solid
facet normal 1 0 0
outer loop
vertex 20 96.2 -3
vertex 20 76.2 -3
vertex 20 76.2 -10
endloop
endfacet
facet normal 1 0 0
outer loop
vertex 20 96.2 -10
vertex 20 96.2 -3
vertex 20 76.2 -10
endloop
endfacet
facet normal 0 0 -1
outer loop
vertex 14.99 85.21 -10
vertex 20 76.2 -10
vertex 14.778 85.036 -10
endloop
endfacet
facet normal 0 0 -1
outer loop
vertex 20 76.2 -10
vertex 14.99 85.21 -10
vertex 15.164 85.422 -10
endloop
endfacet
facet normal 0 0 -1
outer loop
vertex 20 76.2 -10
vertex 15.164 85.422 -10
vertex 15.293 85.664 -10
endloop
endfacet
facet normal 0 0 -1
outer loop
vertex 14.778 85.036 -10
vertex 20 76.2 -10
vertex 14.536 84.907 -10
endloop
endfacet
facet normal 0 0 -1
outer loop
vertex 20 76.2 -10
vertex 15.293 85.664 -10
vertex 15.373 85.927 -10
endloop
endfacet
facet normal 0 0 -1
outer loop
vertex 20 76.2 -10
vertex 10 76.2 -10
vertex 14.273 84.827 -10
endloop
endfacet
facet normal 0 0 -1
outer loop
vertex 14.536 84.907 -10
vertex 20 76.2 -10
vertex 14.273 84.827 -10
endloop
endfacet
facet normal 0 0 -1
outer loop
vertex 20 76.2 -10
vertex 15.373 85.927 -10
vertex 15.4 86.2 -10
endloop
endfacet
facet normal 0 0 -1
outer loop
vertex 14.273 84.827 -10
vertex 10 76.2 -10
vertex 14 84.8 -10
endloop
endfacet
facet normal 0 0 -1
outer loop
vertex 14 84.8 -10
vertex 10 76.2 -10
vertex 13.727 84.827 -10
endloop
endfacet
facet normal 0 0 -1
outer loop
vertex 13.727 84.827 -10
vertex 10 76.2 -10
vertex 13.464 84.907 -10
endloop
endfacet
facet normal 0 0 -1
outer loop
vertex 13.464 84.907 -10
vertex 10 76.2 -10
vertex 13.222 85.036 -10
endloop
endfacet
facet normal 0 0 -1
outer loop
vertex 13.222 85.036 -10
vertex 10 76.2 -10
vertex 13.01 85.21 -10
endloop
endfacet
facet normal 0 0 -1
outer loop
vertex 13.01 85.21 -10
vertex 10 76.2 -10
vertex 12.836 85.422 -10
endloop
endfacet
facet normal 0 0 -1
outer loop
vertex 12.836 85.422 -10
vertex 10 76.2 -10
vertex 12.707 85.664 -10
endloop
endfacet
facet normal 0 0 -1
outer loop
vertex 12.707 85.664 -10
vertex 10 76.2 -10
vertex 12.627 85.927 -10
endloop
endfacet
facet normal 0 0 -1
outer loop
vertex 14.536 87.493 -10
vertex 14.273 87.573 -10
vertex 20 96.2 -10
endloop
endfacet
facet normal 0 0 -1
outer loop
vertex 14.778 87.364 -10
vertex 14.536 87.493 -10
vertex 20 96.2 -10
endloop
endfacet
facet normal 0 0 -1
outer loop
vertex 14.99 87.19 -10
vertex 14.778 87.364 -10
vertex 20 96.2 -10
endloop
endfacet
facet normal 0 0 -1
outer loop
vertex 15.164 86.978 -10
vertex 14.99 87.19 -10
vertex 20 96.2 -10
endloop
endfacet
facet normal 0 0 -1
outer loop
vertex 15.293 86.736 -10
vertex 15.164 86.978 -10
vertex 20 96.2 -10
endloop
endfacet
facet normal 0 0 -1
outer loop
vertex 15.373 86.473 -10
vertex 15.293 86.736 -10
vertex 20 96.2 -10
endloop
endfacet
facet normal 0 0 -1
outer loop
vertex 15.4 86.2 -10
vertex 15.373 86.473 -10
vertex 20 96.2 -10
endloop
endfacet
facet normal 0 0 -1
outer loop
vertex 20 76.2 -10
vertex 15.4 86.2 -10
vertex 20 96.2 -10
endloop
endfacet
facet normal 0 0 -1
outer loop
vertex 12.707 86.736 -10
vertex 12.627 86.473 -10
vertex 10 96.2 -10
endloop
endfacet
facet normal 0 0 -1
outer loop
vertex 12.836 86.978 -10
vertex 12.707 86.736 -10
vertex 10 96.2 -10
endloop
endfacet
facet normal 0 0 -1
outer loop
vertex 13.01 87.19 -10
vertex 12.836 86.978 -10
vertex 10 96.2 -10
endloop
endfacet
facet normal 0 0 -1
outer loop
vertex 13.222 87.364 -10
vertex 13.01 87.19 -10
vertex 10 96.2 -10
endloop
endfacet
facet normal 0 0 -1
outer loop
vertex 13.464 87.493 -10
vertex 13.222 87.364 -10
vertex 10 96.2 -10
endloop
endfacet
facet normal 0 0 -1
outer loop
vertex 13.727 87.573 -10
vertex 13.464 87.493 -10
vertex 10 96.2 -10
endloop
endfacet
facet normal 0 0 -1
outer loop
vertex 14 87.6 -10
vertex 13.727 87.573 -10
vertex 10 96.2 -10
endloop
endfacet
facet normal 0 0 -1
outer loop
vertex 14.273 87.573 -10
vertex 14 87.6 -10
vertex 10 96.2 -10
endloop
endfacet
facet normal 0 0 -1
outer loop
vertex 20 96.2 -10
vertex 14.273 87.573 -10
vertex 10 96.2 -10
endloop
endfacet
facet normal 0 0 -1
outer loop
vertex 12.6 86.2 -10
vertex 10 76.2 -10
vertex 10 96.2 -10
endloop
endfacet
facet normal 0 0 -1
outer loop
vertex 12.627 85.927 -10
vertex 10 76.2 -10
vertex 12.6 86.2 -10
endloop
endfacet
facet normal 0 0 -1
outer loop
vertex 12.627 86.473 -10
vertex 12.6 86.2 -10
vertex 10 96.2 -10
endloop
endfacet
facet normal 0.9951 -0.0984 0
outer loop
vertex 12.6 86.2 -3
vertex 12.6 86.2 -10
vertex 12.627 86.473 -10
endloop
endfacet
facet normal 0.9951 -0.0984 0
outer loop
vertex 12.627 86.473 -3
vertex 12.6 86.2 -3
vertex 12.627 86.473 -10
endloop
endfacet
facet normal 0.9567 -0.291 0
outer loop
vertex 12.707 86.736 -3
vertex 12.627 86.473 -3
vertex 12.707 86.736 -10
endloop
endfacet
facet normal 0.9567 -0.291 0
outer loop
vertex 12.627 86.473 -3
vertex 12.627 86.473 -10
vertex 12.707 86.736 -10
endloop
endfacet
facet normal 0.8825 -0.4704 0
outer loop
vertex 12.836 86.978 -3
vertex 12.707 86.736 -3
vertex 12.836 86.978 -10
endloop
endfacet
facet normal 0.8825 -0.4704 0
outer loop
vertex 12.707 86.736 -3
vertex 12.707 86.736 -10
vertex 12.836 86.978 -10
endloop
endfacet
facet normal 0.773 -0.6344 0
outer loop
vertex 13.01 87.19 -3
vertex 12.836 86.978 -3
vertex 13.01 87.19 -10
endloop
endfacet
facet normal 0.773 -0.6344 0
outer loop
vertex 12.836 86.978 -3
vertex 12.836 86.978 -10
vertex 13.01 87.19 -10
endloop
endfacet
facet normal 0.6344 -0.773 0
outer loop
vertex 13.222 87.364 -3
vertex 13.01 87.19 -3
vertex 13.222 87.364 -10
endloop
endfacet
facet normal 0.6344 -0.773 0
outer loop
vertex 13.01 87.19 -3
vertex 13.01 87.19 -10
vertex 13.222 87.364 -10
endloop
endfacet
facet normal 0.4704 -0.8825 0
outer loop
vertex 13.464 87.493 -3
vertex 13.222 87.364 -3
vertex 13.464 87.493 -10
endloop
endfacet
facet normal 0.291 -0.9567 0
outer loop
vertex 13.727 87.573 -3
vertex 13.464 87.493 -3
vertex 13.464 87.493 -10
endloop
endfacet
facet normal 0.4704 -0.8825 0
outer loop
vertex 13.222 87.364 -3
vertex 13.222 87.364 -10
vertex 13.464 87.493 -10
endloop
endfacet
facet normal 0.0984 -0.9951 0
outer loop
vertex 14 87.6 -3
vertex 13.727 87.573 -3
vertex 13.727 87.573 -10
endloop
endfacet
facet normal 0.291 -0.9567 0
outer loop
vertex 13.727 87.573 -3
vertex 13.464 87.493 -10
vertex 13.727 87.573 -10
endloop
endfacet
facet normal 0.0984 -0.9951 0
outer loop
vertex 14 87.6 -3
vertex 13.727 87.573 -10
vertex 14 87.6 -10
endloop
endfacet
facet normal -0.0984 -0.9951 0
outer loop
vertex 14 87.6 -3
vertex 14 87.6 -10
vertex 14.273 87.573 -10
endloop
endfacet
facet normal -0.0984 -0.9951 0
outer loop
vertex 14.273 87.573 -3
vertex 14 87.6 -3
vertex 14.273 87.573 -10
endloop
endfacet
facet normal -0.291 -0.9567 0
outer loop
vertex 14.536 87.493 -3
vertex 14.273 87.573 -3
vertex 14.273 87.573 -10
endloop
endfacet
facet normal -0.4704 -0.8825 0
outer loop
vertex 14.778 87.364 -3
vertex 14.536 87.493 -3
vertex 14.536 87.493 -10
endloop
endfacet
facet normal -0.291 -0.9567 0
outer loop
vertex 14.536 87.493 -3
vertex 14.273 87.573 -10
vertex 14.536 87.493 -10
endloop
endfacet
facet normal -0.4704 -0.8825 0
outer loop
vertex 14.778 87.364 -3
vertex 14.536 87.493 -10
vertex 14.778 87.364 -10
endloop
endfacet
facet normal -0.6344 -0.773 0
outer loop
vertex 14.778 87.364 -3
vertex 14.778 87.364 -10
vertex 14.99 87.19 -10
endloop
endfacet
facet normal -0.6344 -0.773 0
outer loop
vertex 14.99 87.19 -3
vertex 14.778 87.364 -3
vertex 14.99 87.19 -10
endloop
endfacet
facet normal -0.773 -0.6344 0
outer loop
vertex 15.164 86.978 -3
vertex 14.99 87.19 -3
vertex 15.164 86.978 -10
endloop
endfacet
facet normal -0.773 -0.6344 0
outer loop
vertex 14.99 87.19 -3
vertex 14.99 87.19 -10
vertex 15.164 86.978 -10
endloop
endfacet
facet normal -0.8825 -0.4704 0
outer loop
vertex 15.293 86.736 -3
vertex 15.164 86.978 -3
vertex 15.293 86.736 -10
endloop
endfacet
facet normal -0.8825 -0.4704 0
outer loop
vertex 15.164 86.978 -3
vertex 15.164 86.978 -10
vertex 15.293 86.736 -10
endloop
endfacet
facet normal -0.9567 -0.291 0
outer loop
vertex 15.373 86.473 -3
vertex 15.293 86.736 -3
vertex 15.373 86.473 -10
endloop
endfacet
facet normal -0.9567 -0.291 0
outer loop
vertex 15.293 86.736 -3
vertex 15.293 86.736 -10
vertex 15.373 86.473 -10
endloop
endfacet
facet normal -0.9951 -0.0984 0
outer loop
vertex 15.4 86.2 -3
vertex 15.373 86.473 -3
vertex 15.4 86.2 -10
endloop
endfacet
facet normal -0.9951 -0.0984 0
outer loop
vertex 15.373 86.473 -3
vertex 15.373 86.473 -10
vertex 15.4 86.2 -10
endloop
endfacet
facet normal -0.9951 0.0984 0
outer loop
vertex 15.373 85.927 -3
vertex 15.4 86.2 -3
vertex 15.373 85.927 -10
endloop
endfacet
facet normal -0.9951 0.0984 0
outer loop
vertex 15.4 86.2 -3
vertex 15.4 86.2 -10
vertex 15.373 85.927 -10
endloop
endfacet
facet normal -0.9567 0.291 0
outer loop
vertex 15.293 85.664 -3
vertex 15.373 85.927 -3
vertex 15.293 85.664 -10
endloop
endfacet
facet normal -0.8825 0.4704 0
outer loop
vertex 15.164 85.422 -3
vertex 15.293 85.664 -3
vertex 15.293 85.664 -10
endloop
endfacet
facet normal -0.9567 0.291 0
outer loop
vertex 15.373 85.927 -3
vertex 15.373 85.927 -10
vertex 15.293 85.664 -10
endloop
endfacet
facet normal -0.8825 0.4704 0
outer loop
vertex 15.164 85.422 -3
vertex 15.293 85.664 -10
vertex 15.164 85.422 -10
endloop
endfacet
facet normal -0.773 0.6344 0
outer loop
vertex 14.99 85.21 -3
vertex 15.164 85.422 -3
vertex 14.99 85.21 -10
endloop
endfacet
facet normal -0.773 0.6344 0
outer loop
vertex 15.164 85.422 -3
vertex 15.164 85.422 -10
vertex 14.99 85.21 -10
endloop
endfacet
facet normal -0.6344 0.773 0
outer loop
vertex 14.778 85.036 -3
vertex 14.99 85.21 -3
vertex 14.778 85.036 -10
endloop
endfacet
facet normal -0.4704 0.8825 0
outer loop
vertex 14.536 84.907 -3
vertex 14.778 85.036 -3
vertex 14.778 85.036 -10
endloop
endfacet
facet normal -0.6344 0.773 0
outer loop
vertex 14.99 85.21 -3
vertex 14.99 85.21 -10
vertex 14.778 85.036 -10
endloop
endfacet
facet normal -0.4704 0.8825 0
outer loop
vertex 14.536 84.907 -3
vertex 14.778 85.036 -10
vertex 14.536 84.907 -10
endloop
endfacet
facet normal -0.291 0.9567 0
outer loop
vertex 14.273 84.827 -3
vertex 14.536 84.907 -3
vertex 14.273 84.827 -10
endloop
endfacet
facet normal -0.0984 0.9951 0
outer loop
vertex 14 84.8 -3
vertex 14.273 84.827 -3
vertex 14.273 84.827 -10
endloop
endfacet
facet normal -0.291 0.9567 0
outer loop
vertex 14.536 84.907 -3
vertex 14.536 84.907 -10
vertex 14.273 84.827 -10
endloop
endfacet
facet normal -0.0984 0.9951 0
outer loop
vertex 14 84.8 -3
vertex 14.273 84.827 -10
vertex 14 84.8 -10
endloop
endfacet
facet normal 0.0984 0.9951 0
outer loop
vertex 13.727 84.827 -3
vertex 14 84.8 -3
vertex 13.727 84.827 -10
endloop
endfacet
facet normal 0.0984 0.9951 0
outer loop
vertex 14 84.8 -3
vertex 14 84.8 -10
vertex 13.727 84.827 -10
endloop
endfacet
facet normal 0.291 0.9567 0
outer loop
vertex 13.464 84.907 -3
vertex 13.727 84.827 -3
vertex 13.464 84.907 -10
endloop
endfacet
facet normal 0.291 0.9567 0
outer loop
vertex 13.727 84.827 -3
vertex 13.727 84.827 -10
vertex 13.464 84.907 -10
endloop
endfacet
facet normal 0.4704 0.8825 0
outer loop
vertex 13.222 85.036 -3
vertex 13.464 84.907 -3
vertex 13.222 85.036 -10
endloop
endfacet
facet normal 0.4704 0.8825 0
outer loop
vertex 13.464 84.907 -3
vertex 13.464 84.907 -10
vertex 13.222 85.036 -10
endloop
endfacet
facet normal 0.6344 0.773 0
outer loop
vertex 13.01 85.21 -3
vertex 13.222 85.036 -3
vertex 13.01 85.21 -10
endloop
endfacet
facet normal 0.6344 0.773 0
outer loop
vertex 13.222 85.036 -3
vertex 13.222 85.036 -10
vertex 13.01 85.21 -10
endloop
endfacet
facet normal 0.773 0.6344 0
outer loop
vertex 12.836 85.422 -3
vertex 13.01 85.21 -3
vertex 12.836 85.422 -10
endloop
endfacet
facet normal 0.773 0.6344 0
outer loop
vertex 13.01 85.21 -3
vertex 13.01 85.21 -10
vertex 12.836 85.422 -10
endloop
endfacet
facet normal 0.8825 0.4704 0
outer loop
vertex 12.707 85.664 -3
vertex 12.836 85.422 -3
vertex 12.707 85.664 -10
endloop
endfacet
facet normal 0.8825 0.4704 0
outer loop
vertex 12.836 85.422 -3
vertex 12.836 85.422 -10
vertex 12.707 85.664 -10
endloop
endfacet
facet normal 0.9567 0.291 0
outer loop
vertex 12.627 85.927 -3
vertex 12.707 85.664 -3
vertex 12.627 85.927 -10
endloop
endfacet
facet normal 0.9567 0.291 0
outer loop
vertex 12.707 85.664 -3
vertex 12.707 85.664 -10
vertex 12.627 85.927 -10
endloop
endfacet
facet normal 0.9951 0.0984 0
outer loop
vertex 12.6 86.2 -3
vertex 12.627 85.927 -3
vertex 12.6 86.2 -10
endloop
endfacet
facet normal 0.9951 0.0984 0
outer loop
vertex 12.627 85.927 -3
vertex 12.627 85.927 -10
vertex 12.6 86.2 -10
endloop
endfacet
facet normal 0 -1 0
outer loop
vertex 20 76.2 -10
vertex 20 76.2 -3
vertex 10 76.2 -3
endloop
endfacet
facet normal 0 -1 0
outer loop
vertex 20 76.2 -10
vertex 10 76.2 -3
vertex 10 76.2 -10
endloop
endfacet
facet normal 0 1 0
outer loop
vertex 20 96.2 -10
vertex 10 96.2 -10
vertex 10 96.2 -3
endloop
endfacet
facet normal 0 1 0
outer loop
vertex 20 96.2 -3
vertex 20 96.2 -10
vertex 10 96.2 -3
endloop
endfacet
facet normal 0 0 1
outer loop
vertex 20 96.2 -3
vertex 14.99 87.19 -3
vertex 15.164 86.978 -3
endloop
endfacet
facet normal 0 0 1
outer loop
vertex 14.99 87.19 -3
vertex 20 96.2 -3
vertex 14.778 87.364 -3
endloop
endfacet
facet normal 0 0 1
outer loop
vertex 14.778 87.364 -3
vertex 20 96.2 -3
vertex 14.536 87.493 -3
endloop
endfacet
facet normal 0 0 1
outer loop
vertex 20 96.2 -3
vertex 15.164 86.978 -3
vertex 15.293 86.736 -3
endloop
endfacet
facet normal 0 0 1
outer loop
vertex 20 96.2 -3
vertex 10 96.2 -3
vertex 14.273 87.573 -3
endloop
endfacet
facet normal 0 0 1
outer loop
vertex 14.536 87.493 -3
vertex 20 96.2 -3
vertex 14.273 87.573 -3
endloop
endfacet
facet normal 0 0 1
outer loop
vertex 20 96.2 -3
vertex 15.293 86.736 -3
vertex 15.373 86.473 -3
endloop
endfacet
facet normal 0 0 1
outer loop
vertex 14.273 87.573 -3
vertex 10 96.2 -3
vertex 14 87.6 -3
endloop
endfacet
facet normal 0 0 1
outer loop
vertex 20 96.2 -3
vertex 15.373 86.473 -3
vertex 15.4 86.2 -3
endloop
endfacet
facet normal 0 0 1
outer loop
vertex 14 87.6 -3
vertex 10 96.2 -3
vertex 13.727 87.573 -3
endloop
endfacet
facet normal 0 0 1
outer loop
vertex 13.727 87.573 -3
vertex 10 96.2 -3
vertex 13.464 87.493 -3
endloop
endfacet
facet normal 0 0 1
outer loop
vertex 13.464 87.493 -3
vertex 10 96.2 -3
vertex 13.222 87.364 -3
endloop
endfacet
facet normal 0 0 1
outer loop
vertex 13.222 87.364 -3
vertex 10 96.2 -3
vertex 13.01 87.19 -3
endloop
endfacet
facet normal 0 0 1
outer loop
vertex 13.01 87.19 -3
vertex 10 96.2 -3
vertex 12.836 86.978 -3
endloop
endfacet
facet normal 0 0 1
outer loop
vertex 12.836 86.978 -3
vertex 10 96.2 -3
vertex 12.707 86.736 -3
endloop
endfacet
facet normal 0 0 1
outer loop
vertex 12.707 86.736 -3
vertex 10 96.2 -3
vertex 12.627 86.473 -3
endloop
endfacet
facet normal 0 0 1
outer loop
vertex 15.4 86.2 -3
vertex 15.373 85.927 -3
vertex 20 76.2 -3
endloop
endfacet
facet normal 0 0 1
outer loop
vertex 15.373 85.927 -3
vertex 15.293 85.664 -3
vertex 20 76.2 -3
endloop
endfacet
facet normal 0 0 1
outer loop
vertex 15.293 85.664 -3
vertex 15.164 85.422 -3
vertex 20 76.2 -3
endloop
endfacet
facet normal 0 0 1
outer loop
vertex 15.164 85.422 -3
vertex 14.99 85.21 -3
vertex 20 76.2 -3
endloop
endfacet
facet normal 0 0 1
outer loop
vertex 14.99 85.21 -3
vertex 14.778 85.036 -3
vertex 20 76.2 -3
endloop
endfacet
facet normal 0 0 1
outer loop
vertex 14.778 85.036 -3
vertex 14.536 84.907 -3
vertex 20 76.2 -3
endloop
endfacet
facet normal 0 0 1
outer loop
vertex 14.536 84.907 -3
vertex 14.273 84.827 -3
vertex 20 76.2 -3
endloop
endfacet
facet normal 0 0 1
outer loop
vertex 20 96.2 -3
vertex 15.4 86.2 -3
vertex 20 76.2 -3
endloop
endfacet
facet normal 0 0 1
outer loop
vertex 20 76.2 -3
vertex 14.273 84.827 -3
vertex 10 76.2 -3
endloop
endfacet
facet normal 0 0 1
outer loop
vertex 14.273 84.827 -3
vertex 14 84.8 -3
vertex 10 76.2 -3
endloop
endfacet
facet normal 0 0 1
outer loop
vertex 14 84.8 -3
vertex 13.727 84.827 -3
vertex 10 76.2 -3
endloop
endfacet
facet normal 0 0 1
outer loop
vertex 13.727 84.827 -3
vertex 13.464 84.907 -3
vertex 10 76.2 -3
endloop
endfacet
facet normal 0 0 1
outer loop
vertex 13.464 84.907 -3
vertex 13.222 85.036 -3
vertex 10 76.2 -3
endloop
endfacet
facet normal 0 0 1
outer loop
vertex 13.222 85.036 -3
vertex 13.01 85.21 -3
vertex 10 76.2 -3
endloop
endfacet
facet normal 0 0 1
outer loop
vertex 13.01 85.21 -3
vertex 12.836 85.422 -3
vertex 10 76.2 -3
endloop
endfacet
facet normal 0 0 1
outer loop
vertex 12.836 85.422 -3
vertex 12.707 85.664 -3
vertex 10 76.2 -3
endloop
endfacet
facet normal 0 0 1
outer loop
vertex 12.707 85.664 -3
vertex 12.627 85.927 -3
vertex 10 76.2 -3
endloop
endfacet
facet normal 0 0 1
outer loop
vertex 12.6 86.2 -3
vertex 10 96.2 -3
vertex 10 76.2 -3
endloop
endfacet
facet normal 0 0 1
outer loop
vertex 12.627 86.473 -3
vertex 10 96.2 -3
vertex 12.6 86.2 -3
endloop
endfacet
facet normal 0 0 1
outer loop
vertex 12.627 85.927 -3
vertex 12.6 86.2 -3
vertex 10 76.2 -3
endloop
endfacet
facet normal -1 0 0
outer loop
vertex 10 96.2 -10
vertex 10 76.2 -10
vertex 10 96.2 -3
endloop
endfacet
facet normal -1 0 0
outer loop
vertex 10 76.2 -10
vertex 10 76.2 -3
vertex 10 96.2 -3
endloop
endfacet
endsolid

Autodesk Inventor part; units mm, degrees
ref_plane "YZ Plane" through (0, 0, 0) normal (1, 0, 0) x (0, 1, 0)
ref_plane "XZ Plane" through (0, 0, 0) normal (0, 1, 0) x (-1, 0, 0)
ref_plane "XY Plane" through (0, 0, 0) normal (0, 0, 1) x (1, 0, 0)
sketch "Sketch1" plane through (0, 0, 0) normal (0, 1, 0) x (-1, 0, 0)
  line L0 (-7.25, 7.25) -> (7.25, 7.25)
  line L1 (7.25, 7.25) -> (7.25, -7.25)
  line L2 (7.25, -7.25) -> (-7.25, -7.25)
  line L3 (-7.25, -7.25) -> (-7.25, 7.25)
  line L4 (-7.25, 7.25) -> (7.25, -7.25) construction
  line L5 (7.25, 7.25) -> (-7.25, -7.25) construction
  point P0 (0, 0)
  dimension "d0" = 14.5
  dimension "d1" = 14.5
extrude "Extrusion1" add sketch "Sketch1" along normal blind 76.2
sketch "Sketch2" plane through (0, 76.2, 0) normal (0, 1, 0) x (1, 0, 0)
  line L0 (10, -10) -> (-10, -10)
  line L1 (-10, -10) -> (-10, 10)
  line L2 (-10, 10) -> (10, 10)
  line L3 (10, 10) -> (10, -10)
  line L4 (10, -10) -> (-10, 10) construction
  line L5 (-10, -10) -> (10, 10) construction
  point P0 (0, 0)
  dimension "d4" = 20
  dimension "d5" = 20
extrude "Extrusion2" add sketch "Sketch2" along normal blind 5
sketch "Sketch3" plane through (0, 81.2, 0) normal (0, 1, 0) x (1, 0, 0)
  line L0 (7.5, -7.5) -> (-7.5, -7.5)
  line L1 (-7.5, -7.5) -> (-7.5, 7.5)
  line L2 (-7.5, 7.5) -> (7.5, 7.5)
  line L3 (7.5, 7.5) -> (7.5, -7.5)
  line L4 (7.5, -7.5) -> (-7.5, 7.5) construction
  line L5 (-7.5, -7.5) -> (7.5, 7.5) construction
  line L6 (10, -10) -> (-10, -10)
  line L7 (-10, -10) -> (-10, 10)
  line L8 (-10, 10) -> (10, 10)
  line L9 (10, 10) -> (10, -10)
  line L10 (10, -10) -> (-10, 10) construction
  line L11 (-10, -10) -> (10, 10) construction
  point P0 (0, 0)
  dimension "d8" = 15
  dimension "d9" = 15
extrude "Extrusion3" add sketch "Sketch3" along normal blind 76.2
sketch "Sketch4" plane through (10, 76.2, 10) normal (1, 0, 0) x (0, 0, -1)
  line L0 (20, 0) -> (20, 81.2) projected
  line L1 (15, 81.2) -> (15, 0)
  line L2 (0, 0) -> (20, 0) projected
  line L3 (15, 81.2) -> (13, 81.2)
  line L4 (17.5, 81.2) -> (2.5, 81.2) projected
  line L5 (13, 81.2) -> (13, 0)
  line L6 (13, 0) -> (15, 0)
  line L7 (20, 81.2) -> (0, 81.2) projected
  point P0 (10, -76.2)
  dimension "d12" = 2
extrude "Extrusion4" add sketch "Sketch4" along normal blind 10 contours L2 L5 L3 L1
sketch "Sketch5" plane through (10, 76.2, -3) normal (0, 0, 1) x (1, 0, 0)
  line L0 (0, 81.2) -> (10, 81.2) projected
  line L1 (10, 81.2) -> (8, 81.2)
  line L2 (8, 81.2) -> (8, 0)
  line L3 (8, 0) -> (10, 0)
  line L4 (10, 0) -> (10, 81.2)
  point P0 (-10, -76.2)
  dimension "d15" = 2
extrude "Extrusion5" add sketch "Sketch5" along normal blind 8
sketch "Sketch6" plane through (20, 76.2, 10) normal (1, 0, 0) x (0, 0, -1)
  line L0 (5, 81.2) -> (3, 81.2)
  line L1 (3, 81.2) -> (3, 0)
  line L2 (3, 0) -> (5, 0)
  line L3 (5, 0) -> (5, 81.2)
  point P0 (10, -76.2)
  dimension "d18" = 2
extrude "Extrusion6" add sketch "Sketch6" against normal blind 4
sketch "Sketch7" plane through (0, 76.2, 0) normal (0, -1, 0) x (1, 0, 0)
  line L0 (10, -5) -> (20, -5)
  line L1 (20, -5) -> (20, 7)
  line L2 (20, 7) -> (10, 7)
  line L3 (10, 7) -> (10, -5)
  point P0 (0, 0)
extrude "Extrusion7" cut sketch "Sketch7" against normal through all
sketch "Sketch8" plane through (7.25, 0, -7.25) normal (0, 0, -1) x (-1, 0, 0)
  line L0 (0, 0) -> (0, 76.2)
  line L1 (0, 0) -> (0, 76.2) projected
  line L2 (0, 38.1) -> (14.5, 38.1)
  line L3 (14.5, 38.1) -> (14.5, 0)
  line L4 (14.5, 0) -> (0, 0)
  line L5 (0, 0) -> (0, 38.1)
  point P0 (7.25, 0)
extrude "Extrusion8" cut sketch "Sketch8" against normal through all
sketch "Sketch9" plane through (10, 76.2, -10) normal (0, 0, -1) x (-1, 0, 0)
  line L0 (0, 0) -> (0, 20)
  line L1 (0, 0) -> (0, 81.2) projected
  line L2 (0, 20) -> (20, 20)
  line L3 (20, 20) -> (20, 81.2)
  line L4 (20, 81.2) -> (0, 81.2)
  line L5 (0, 81.2) -> (0, 20)
  point P0 (10, -76.2)
  dimension "d25" = 20
extrude "Extrusion9" cut sketch "Sketch9" against normal through all
sketch "Sketch10" plane through (-10, 96.2, -10) normal (0, 1, 0) x (1, 0, 0)
  line L0 (17.5, -2.5) -> (2.5, -2.5)
  line L1 (2.5, -2.5) -> (2.5, -17.5)
  line L2 (2.5, -17.5) -> (17.5, -17.5)
  line L3 (17.5, -17.5) -> (17.5, -2.5)
  point P0 (10, -10)
extrude "Extrusion10" add sketch "Sketch10" against normal blind 15
sketch "Sketch12" plane through (10, 76.2, 10) normal (1, 0, 0) x (0, 0, -1)
  line L0 (20, 20) -> (9, 20)
  line L1 (20, 20) -> (0, 20) projected
  line L2 (2.75, 0) -> (17.25, 0) projected
  line L3 (20, 20) -> (13, 20)
  line L4 (13, 20) -> (13, 0)
  line L5 (13, 0) -> (20, 0)
  line L6 (20, 0) -> (20, 20)
  point P0 (10, -76.2)
  dimension "d30" = 11
  dimension "d31" = 7
extrude "Extrusion11" add sketch "Sketch12" along normal blind 10
sketch "Sketch13" plane through (-10, 76.2, -10) normal (0, 0, -1) x (-1, 0, 0)
  line L0 (-17.25, 0) -> (-17.25, 20)
  line L1 (0, 20) -> (-30, 20) projected
  line L2 (-17.25, -38.1) -> (-17.25, 0) projected
  line L3 (-20, 0) -> (-20, 20)
  line L4 (-20, 0) -> (-20, 20) projected
  line L5 (-20, 10) -> (-24, 10)
  circle A0 centre (-24, 10) radius 1.4
  point P0 (-10, -76.2)
  dimension "d34" = 4
  dimension "d35" = 2.8
extrude "Extrusion12" cut sketch "Sketch13" against normal through all
sketch "Sketch14" plane through (-10, 76.2, 10) normal (0, 0, 1) x (1, 0, 0)
  line L0 (20, 20) -> (-2.0792, 20)
  line L1 (-2.0792, 20) -> (-2.0792, -41.5278)
  line L2 (-2.0792, -41.5278) -> (20, -41.5278)
  line L3 (20, -41.5278) -> (20, 20)
  point P0 (10, -76.2)
extrude "Extrusion13" cut sketch "Sketch14" against normal through all
properties part number "NailBitHold"
